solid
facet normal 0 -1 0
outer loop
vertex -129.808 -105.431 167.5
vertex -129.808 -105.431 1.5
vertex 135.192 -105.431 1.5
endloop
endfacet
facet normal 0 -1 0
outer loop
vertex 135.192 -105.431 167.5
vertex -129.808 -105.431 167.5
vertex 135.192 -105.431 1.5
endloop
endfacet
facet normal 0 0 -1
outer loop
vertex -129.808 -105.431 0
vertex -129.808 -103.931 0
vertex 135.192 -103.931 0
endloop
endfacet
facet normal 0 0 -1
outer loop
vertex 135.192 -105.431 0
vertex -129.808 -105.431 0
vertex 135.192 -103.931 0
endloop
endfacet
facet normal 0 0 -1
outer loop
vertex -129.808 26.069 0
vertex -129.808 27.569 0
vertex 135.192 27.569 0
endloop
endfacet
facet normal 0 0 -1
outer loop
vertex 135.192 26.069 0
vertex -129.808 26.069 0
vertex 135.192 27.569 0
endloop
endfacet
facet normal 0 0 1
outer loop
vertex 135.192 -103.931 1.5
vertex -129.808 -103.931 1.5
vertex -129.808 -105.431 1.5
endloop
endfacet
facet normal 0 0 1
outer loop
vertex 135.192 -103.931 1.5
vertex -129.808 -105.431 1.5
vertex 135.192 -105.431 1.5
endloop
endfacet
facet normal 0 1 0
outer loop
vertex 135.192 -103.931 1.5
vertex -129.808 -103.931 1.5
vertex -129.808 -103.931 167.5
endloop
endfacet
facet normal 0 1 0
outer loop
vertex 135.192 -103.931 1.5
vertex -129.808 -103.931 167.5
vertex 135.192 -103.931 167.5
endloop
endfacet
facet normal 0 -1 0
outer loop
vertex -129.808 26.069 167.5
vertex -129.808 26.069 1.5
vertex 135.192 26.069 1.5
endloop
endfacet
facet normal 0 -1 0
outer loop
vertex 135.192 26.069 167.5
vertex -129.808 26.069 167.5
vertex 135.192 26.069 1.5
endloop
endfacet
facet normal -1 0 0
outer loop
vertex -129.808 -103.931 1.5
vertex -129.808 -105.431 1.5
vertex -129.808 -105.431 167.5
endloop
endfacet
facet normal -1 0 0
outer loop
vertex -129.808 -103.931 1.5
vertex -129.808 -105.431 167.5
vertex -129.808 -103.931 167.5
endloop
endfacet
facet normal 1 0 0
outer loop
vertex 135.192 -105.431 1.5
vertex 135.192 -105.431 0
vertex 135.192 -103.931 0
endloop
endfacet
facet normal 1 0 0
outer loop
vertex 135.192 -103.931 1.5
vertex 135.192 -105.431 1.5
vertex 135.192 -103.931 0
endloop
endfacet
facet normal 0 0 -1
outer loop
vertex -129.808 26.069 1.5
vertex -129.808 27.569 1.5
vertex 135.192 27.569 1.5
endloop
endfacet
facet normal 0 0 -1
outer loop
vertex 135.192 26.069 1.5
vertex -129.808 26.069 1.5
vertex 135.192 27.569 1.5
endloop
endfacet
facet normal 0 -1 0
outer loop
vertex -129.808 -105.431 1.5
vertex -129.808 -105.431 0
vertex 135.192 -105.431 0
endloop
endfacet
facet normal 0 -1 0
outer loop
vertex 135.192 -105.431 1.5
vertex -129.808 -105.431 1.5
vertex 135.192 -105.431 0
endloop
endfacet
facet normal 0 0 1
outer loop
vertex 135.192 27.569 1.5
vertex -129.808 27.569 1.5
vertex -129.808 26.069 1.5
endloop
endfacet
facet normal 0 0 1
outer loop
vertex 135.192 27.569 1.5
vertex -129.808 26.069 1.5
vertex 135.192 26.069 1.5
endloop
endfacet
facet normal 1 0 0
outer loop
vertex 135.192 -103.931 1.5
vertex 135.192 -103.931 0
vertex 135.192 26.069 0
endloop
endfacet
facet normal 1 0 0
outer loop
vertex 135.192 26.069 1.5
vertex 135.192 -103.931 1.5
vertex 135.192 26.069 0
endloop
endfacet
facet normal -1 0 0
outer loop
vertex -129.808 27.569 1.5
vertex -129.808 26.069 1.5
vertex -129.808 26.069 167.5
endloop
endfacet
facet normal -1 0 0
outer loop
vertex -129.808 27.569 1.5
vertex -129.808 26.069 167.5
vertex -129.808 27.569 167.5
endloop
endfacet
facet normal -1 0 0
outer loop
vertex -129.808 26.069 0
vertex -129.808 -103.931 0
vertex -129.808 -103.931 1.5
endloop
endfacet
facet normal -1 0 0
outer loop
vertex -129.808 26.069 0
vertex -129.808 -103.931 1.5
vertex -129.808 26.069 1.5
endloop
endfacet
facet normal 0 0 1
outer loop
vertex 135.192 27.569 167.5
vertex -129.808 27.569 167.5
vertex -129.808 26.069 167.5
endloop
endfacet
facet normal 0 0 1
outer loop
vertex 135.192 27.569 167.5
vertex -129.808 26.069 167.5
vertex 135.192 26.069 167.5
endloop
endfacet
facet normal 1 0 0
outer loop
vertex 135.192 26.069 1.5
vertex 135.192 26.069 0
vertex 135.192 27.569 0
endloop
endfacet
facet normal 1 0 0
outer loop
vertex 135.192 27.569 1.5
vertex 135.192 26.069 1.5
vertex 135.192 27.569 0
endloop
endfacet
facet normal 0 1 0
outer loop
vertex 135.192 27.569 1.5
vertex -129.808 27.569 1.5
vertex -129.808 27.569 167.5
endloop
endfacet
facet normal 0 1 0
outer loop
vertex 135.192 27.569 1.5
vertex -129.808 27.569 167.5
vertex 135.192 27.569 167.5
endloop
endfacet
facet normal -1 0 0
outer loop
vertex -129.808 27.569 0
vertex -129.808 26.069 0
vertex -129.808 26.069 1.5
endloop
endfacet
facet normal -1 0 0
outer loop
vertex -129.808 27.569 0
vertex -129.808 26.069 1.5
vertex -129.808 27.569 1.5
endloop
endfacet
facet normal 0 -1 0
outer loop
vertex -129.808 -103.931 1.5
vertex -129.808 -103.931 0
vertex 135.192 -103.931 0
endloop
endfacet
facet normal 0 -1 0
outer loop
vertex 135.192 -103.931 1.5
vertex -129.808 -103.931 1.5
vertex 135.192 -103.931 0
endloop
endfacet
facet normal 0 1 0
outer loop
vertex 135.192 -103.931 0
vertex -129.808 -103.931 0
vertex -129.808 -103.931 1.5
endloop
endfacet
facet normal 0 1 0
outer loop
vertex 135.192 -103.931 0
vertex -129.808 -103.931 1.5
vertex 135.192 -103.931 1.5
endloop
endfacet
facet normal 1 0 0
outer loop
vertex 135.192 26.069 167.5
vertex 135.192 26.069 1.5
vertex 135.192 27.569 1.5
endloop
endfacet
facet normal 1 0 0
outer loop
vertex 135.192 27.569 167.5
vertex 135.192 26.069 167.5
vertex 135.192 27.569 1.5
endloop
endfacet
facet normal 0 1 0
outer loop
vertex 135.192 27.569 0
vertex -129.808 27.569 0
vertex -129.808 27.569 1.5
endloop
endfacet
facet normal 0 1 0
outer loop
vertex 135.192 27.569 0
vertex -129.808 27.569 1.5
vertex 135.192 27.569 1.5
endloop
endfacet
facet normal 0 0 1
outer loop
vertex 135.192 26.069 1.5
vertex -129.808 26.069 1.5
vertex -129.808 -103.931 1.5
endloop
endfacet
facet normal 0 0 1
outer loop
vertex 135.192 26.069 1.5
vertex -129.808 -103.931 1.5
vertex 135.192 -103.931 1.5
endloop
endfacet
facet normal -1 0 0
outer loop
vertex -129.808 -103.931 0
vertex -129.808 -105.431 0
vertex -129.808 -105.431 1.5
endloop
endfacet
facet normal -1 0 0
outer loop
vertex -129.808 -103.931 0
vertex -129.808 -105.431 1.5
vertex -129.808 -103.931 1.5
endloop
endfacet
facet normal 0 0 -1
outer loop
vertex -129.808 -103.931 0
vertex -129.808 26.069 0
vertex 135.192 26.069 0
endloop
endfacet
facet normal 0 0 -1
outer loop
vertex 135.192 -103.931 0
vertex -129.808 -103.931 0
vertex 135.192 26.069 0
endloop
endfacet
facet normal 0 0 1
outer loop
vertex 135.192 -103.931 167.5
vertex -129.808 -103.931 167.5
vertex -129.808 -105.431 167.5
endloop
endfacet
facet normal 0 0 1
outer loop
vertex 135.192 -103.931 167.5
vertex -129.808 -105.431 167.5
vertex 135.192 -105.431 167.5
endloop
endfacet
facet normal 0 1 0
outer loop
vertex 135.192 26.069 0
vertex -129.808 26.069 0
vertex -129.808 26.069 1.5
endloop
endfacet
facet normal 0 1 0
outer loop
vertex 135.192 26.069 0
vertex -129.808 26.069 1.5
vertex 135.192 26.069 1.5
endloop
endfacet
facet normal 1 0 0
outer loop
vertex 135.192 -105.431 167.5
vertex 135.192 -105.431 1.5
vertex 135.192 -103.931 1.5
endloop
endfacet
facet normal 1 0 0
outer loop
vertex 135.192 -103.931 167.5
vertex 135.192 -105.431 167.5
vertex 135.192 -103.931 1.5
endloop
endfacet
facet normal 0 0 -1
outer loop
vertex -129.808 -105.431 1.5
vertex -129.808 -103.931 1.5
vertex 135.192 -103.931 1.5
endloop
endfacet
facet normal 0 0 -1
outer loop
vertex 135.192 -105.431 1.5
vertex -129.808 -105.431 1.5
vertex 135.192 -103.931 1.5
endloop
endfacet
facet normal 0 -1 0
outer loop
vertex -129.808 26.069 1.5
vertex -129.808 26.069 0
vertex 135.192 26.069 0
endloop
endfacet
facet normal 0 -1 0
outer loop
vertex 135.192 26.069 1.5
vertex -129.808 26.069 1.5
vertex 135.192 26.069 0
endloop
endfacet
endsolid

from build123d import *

# Parameters (mm, degrees)
F2_W     = 265
F2_H     = 1.5
F3_DEPTH = 1.5
F0_W     = 265
F0_H     = 130
F1_W     = 265
F1_H     = 1.5
F4_DEPTH = 166


with BuildPart() as f3:
    # F2 (on Top) → F3 (new body)
    with BuildSketch(Plane.XY):
        with Locations((2.6923064142, 26.8188768528)):
            Rectangle(F2_W, F2_H)
    extrude(amount=F3_DEPTH)


with BuildPart() as f3b:
    # F0 (on Top) → F3, piece 2 (new body)
    with BuildSketch(Plane.XY):
        with Locations((2.6923064142, -38.9311231472)):
            Rectangle(F0_W, F0_H)
    extrude(amount=F3_DEPTH)


with BuildPart() as f3c:
    # F1 (on Top) → F3, piece 3 (new body)
    with BuildSketch(Plane.XY):
        with Locations((2.6923064142, -104.6811231472)):
            Rectangle(F1_W, F1_H)
    extrude(amount=F3_DEPTH)


with BuildPart() as f4:
    # F4 (new): a face of the model
    f4_faces = [f3.part.faces().sort_by_distance(p)[0] for p in [
        (2.6923064142, 26.8188768528, 1.5),
    ]]
    extrude(f4_faces, amount=F4_DEPTH)


with BuildPart() as f4b:
    # F4#2 (new): a face of the model
    f4_2_faces = [f3c.part.faces().sort_by_distance(p)[0] for p in [
        (2.6923064142, -104.6811231472, 1.5),
    ]]
    extrude(f4_2_faces, amount=F4_DEPTH)


solid = Compound([f3.part, f3b.part, f3c.part, f4.part, f4b.part])
